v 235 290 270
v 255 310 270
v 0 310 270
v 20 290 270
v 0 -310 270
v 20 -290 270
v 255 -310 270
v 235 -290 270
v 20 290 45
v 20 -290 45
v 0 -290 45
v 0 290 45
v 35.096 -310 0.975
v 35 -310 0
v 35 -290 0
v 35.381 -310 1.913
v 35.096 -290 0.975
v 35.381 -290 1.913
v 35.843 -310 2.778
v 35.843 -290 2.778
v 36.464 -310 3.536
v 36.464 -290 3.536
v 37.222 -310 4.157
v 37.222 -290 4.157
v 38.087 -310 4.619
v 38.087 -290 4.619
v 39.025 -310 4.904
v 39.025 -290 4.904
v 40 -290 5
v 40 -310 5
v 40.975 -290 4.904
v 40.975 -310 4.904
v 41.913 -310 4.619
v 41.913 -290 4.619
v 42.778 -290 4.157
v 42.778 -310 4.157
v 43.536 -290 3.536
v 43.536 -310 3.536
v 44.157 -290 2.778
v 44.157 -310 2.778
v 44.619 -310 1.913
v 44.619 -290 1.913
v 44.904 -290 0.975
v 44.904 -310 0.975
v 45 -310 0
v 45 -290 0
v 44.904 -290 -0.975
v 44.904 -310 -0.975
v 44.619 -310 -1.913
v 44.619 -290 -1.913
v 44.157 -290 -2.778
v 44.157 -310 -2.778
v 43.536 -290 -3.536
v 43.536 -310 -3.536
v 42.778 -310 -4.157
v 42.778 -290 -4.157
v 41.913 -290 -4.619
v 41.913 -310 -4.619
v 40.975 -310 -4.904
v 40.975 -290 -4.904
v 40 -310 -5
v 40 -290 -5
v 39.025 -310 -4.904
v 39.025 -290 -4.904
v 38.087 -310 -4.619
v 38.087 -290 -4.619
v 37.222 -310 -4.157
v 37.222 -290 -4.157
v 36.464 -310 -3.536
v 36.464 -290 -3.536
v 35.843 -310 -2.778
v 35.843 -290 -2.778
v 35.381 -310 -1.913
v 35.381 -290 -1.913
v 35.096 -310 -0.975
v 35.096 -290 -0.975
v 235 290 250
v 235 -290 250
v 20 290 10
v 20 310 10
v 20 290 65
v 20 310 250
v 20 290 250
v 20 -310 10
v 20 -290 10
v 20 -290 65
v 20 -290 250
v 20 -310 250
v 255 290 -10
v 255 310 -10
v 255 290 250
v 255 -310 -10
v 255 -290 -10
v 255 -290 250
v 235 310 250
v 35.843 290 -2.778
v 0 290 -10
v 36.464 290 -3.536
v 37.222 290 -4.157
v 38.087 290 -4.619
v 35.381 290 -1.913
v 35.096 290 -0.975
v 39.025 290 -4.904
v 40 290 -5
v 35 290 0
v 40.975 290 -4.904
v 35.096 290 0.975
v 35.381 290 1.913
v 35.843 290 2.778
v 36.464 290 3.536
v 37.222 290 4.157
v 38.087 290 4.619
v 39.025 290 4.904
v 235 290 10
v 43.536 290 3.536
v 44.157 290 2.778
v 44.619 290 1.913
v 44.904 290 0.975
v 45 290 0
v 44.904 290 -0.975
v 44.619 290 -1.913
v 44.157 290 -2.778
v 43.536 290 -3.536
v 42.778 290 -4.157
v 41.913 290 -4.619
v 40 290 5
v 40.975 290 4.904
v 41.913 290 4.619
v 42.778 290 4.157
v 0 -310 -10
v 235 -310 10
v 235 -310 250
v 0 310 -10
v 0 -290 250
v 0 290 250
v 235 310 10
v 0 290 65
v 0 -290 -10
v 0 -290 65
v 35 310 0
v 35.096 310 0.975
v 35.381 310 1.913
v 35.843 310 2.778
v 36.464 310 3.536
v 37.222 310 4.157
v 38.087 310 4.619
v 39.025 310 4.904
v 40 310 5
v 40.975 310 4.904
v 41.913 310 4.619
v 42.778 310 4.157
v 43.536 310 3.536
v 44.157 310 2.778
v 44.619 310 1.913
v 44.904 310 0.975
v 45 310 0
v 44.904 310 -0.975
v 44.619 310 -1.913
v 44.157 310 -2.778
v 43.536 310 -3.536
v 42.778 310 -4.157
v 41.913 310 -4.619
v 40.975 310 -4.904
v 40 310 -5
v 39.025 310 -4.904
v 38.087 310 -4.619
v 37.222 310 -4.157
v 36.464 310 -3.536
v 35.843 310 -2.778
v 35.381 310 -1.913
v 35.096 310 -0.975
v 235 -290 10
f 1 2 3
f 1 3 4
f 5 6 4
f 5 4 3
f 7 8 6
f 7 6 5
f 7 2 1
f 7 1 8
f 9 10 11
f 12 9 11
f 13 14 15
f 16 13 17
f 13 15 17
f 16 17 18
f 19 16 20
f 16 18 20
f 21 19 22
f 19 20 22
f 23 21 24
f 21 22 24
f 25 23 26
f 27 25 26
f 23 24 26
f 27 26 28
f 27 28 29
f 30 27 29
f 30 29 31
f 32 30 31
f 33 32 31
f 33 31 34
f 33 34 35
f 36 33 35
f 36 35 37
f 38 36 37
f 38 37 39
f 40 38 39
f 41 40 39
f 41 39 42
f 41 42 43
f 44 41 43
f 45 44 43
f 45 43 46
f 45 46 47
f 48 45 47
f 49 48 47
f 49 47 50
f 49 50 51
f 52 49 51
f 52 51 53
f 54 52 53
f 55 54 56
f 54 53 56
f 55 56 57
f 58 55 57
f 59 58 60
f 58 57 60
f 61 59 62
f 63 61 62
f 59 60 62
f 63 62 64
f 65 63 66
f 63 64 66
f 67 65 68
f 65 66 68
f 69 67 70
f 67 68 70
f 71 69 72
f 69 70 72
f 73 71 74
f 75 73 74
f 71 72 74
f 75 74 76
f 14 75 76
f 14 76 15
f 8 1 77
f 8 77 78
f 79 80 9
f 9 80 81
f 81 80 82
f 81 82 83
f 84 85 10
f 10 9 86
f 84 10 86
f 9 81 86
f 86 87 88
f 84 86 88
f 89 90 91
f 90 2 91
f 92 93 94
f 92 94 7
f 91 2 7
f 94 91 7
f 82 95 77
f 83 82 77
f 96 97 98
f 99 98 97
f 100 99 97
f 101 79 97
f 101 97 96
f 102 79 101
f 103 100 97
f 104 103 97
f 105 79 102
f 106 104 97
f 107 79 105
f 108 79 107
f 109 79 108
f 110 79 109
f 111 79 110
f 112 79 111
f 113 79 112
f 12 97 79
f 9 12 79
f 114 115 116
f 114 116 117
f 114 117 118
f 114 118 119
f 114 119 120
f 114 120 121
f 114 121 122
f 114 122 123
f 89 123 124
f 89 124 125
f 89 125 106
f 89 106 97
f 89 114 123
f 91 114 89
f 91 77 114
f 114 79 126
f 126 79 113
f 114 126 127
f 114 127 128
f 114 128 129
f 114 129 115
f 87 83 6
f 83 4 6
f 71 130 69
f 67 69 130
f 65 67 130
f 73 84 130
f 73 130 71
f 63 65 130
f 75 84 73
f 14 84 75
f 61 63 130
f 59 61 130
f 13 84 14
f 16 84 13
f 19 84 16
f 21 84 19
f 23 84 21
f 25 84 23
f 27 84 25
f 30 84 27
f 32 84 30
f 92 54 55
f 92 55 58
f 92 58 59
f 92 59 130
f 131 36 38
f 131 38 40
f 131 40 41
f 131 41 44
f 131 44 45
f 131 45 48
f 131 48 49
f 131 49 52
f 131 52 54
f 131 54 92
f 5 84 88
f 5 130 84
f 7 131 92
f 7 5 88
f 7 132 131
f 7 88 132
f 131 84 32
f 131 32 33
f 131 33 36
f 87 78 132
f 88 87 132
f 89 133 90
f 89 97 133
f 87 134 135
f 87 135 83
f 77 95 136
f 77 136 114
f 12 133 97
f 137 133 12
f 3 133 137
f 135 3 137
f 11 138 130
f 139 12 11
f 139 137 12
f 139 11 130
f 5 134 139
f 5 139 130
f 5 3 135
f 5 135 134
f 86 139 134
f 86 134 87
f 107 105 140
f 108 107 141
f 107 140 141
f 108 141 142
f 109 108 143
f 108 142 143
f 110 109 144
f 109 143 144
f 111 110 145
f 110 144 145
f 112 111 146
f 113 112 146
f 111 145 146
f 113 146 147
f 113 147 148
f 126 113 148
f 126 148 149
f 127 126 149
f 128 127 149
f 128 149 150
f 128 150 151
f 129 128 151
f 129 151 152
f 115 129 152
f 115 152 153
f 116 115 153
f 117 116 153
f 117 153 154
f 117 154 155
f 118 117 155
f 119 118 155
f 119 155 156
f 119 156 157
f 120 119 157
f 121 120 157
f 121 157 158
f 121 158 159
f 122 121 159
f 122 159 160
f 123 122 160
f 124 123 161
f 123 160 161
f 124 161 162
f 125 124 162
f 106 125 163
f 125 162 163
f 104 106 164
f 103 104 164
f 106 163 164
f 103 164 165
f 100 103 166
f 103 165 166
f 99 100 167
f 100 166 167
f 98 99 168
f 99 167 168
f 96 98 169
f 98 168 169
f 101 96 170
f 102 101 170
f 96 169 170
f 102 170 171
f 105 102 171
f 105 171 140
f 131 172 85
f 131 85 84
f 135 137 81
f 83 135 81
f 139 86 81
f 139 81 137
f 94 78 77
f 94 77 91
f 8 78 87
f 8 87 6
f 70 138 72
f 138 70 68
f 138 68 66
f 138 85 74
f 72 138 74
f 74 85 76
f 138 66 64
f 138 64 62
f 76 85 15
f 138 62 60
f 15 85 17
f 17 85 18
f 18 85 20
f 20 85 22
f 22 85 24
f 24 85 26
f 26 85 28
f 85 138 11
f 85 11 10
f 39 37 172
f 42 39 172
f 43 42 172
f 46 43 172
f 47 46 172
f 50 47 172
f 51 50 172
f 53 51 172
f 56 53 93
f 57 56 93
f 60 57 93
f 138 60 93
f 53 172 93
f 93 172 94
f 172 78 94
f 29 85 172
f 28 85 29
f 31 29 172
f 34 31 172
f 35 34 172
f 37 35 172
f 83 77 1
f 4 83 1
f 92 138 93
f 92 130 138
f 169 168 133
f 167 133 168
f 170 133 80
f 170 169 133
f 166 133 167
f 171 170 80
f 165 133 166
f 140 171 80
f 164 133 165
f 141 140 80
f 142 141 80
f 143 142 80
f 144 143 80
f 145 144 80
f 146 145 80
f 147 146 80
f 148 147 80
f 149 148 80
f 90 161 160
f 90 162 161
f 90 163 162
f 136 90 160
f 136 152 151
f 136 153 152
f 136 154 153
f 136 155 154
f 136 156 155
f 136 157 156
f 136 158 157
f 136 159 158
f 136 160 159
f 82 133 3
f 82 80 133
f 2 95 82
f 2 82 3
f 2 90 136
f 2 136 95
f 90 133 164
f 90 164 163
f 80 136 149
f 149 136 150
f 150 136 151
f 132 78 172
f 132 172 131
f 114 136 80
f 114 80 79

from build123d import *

# Parameters (mm, degrees)
F0_W     = 20
F0_H     = 20
F1_DEPTH = 310
F2_W     = 20
F2_H     = 20
F3_DEPTH = 260
F4_W     = 20
F4_H     = 20
F5_DEPTH = 215
F6_W     = 20
F6_H     = 20
F7_DEPTH = 580
F8_R     = 5
F9_DEPTH = 620


with BuildPart() as f1:
    # F0 (on Front) → F1 (new body, symmetric)
    with BuildSketch(Plane.XZ):
        with Locations((10, 260)):
            Rectangle(F0_W, F0_H)
    extrude(amount=F1_DEPTH, both=True)

    # F2 (on face) → F3 (join)
    with BuildSketch(Plane(origin=(0, 0, 250), x_dir=(1, 0, 0), z_dir=(0, 0, -1))):
        with Locations((10, 300)):
            Rectangle(F2_W, F2_H)
        with Locations((10, -300)):
            Rectangle(F2_W, F2_H)
    extrude(amount=F3_DEPTH)



with BuildPart() as f1b:
    # F0 (on Front) → F1, piece 2 (new body, symmetric)
    with BuildSketch(Plane.XZ):
        with Locations((245, 260)):
            Rectangle(F0_W, F0_H)
    extrude(amount=F1_DEPTH, both=True)

    # F2 (on face) → F3, piece 2 (join)
    with BuildSketch(Plane(origin=(0, 0, 250), x_dir=(1, 0, 0), z_dir=(0, 0, -1))):
        with Locations((245, -300)):
            Rectangle(F2_W, F2_H)
        with Locations((245, 300)):
            Rectangle(F2_W, F2_H)
    extrude(amount=F3_DEPTH)


with BuildPart() as f1_1:
    add(f1.part)

    add(f1b.part)  # F5 merges F1b
    # F4 (on face) → F5 (join, through all)
    with BuildSketch(Plane(origin=(235, 0, 0), x_dir=(0, -1, 0), z_dir=(-1, 0, 0))):
        with Locations((-300, 260)):
            Rectangle(F4_W, F4_H)
        with Locations((-300, 0)):
            Rectangle(F4_W, F4_H)
        with Locations((300, 0)):
            Rectangle(F4_W, F4_H)
        with Locations((300, 260)):
            Rectangle(F4_W, F4_H)
    extrude(amount=F5_DEPTH)

    # F6 (on face) → F7 (join, through all)
    with BuildSketch(Plane(origin=(0, -290, 0), x_dir=(-1, 0, 0), z_dir=(0, 1, 0))):
        with Locations((-10, 55)):
            Rectangle(F6_W, F6_H)
    extrude(amount=F7_DEPTH)

    # F8 (on face) → F9 (cut, through all)
    with BuildSketch(Plane(origin=(0, 310, 0), x_dir=(-1, 0, 0), z_dir=(0, 1, 0))):
        with Locations((-40, 0)):
            Circle(F8_R)
    extrude(amount=-F9_DEPTH, mode=Mode.SUBTRACT)


solid = f1_1.part
